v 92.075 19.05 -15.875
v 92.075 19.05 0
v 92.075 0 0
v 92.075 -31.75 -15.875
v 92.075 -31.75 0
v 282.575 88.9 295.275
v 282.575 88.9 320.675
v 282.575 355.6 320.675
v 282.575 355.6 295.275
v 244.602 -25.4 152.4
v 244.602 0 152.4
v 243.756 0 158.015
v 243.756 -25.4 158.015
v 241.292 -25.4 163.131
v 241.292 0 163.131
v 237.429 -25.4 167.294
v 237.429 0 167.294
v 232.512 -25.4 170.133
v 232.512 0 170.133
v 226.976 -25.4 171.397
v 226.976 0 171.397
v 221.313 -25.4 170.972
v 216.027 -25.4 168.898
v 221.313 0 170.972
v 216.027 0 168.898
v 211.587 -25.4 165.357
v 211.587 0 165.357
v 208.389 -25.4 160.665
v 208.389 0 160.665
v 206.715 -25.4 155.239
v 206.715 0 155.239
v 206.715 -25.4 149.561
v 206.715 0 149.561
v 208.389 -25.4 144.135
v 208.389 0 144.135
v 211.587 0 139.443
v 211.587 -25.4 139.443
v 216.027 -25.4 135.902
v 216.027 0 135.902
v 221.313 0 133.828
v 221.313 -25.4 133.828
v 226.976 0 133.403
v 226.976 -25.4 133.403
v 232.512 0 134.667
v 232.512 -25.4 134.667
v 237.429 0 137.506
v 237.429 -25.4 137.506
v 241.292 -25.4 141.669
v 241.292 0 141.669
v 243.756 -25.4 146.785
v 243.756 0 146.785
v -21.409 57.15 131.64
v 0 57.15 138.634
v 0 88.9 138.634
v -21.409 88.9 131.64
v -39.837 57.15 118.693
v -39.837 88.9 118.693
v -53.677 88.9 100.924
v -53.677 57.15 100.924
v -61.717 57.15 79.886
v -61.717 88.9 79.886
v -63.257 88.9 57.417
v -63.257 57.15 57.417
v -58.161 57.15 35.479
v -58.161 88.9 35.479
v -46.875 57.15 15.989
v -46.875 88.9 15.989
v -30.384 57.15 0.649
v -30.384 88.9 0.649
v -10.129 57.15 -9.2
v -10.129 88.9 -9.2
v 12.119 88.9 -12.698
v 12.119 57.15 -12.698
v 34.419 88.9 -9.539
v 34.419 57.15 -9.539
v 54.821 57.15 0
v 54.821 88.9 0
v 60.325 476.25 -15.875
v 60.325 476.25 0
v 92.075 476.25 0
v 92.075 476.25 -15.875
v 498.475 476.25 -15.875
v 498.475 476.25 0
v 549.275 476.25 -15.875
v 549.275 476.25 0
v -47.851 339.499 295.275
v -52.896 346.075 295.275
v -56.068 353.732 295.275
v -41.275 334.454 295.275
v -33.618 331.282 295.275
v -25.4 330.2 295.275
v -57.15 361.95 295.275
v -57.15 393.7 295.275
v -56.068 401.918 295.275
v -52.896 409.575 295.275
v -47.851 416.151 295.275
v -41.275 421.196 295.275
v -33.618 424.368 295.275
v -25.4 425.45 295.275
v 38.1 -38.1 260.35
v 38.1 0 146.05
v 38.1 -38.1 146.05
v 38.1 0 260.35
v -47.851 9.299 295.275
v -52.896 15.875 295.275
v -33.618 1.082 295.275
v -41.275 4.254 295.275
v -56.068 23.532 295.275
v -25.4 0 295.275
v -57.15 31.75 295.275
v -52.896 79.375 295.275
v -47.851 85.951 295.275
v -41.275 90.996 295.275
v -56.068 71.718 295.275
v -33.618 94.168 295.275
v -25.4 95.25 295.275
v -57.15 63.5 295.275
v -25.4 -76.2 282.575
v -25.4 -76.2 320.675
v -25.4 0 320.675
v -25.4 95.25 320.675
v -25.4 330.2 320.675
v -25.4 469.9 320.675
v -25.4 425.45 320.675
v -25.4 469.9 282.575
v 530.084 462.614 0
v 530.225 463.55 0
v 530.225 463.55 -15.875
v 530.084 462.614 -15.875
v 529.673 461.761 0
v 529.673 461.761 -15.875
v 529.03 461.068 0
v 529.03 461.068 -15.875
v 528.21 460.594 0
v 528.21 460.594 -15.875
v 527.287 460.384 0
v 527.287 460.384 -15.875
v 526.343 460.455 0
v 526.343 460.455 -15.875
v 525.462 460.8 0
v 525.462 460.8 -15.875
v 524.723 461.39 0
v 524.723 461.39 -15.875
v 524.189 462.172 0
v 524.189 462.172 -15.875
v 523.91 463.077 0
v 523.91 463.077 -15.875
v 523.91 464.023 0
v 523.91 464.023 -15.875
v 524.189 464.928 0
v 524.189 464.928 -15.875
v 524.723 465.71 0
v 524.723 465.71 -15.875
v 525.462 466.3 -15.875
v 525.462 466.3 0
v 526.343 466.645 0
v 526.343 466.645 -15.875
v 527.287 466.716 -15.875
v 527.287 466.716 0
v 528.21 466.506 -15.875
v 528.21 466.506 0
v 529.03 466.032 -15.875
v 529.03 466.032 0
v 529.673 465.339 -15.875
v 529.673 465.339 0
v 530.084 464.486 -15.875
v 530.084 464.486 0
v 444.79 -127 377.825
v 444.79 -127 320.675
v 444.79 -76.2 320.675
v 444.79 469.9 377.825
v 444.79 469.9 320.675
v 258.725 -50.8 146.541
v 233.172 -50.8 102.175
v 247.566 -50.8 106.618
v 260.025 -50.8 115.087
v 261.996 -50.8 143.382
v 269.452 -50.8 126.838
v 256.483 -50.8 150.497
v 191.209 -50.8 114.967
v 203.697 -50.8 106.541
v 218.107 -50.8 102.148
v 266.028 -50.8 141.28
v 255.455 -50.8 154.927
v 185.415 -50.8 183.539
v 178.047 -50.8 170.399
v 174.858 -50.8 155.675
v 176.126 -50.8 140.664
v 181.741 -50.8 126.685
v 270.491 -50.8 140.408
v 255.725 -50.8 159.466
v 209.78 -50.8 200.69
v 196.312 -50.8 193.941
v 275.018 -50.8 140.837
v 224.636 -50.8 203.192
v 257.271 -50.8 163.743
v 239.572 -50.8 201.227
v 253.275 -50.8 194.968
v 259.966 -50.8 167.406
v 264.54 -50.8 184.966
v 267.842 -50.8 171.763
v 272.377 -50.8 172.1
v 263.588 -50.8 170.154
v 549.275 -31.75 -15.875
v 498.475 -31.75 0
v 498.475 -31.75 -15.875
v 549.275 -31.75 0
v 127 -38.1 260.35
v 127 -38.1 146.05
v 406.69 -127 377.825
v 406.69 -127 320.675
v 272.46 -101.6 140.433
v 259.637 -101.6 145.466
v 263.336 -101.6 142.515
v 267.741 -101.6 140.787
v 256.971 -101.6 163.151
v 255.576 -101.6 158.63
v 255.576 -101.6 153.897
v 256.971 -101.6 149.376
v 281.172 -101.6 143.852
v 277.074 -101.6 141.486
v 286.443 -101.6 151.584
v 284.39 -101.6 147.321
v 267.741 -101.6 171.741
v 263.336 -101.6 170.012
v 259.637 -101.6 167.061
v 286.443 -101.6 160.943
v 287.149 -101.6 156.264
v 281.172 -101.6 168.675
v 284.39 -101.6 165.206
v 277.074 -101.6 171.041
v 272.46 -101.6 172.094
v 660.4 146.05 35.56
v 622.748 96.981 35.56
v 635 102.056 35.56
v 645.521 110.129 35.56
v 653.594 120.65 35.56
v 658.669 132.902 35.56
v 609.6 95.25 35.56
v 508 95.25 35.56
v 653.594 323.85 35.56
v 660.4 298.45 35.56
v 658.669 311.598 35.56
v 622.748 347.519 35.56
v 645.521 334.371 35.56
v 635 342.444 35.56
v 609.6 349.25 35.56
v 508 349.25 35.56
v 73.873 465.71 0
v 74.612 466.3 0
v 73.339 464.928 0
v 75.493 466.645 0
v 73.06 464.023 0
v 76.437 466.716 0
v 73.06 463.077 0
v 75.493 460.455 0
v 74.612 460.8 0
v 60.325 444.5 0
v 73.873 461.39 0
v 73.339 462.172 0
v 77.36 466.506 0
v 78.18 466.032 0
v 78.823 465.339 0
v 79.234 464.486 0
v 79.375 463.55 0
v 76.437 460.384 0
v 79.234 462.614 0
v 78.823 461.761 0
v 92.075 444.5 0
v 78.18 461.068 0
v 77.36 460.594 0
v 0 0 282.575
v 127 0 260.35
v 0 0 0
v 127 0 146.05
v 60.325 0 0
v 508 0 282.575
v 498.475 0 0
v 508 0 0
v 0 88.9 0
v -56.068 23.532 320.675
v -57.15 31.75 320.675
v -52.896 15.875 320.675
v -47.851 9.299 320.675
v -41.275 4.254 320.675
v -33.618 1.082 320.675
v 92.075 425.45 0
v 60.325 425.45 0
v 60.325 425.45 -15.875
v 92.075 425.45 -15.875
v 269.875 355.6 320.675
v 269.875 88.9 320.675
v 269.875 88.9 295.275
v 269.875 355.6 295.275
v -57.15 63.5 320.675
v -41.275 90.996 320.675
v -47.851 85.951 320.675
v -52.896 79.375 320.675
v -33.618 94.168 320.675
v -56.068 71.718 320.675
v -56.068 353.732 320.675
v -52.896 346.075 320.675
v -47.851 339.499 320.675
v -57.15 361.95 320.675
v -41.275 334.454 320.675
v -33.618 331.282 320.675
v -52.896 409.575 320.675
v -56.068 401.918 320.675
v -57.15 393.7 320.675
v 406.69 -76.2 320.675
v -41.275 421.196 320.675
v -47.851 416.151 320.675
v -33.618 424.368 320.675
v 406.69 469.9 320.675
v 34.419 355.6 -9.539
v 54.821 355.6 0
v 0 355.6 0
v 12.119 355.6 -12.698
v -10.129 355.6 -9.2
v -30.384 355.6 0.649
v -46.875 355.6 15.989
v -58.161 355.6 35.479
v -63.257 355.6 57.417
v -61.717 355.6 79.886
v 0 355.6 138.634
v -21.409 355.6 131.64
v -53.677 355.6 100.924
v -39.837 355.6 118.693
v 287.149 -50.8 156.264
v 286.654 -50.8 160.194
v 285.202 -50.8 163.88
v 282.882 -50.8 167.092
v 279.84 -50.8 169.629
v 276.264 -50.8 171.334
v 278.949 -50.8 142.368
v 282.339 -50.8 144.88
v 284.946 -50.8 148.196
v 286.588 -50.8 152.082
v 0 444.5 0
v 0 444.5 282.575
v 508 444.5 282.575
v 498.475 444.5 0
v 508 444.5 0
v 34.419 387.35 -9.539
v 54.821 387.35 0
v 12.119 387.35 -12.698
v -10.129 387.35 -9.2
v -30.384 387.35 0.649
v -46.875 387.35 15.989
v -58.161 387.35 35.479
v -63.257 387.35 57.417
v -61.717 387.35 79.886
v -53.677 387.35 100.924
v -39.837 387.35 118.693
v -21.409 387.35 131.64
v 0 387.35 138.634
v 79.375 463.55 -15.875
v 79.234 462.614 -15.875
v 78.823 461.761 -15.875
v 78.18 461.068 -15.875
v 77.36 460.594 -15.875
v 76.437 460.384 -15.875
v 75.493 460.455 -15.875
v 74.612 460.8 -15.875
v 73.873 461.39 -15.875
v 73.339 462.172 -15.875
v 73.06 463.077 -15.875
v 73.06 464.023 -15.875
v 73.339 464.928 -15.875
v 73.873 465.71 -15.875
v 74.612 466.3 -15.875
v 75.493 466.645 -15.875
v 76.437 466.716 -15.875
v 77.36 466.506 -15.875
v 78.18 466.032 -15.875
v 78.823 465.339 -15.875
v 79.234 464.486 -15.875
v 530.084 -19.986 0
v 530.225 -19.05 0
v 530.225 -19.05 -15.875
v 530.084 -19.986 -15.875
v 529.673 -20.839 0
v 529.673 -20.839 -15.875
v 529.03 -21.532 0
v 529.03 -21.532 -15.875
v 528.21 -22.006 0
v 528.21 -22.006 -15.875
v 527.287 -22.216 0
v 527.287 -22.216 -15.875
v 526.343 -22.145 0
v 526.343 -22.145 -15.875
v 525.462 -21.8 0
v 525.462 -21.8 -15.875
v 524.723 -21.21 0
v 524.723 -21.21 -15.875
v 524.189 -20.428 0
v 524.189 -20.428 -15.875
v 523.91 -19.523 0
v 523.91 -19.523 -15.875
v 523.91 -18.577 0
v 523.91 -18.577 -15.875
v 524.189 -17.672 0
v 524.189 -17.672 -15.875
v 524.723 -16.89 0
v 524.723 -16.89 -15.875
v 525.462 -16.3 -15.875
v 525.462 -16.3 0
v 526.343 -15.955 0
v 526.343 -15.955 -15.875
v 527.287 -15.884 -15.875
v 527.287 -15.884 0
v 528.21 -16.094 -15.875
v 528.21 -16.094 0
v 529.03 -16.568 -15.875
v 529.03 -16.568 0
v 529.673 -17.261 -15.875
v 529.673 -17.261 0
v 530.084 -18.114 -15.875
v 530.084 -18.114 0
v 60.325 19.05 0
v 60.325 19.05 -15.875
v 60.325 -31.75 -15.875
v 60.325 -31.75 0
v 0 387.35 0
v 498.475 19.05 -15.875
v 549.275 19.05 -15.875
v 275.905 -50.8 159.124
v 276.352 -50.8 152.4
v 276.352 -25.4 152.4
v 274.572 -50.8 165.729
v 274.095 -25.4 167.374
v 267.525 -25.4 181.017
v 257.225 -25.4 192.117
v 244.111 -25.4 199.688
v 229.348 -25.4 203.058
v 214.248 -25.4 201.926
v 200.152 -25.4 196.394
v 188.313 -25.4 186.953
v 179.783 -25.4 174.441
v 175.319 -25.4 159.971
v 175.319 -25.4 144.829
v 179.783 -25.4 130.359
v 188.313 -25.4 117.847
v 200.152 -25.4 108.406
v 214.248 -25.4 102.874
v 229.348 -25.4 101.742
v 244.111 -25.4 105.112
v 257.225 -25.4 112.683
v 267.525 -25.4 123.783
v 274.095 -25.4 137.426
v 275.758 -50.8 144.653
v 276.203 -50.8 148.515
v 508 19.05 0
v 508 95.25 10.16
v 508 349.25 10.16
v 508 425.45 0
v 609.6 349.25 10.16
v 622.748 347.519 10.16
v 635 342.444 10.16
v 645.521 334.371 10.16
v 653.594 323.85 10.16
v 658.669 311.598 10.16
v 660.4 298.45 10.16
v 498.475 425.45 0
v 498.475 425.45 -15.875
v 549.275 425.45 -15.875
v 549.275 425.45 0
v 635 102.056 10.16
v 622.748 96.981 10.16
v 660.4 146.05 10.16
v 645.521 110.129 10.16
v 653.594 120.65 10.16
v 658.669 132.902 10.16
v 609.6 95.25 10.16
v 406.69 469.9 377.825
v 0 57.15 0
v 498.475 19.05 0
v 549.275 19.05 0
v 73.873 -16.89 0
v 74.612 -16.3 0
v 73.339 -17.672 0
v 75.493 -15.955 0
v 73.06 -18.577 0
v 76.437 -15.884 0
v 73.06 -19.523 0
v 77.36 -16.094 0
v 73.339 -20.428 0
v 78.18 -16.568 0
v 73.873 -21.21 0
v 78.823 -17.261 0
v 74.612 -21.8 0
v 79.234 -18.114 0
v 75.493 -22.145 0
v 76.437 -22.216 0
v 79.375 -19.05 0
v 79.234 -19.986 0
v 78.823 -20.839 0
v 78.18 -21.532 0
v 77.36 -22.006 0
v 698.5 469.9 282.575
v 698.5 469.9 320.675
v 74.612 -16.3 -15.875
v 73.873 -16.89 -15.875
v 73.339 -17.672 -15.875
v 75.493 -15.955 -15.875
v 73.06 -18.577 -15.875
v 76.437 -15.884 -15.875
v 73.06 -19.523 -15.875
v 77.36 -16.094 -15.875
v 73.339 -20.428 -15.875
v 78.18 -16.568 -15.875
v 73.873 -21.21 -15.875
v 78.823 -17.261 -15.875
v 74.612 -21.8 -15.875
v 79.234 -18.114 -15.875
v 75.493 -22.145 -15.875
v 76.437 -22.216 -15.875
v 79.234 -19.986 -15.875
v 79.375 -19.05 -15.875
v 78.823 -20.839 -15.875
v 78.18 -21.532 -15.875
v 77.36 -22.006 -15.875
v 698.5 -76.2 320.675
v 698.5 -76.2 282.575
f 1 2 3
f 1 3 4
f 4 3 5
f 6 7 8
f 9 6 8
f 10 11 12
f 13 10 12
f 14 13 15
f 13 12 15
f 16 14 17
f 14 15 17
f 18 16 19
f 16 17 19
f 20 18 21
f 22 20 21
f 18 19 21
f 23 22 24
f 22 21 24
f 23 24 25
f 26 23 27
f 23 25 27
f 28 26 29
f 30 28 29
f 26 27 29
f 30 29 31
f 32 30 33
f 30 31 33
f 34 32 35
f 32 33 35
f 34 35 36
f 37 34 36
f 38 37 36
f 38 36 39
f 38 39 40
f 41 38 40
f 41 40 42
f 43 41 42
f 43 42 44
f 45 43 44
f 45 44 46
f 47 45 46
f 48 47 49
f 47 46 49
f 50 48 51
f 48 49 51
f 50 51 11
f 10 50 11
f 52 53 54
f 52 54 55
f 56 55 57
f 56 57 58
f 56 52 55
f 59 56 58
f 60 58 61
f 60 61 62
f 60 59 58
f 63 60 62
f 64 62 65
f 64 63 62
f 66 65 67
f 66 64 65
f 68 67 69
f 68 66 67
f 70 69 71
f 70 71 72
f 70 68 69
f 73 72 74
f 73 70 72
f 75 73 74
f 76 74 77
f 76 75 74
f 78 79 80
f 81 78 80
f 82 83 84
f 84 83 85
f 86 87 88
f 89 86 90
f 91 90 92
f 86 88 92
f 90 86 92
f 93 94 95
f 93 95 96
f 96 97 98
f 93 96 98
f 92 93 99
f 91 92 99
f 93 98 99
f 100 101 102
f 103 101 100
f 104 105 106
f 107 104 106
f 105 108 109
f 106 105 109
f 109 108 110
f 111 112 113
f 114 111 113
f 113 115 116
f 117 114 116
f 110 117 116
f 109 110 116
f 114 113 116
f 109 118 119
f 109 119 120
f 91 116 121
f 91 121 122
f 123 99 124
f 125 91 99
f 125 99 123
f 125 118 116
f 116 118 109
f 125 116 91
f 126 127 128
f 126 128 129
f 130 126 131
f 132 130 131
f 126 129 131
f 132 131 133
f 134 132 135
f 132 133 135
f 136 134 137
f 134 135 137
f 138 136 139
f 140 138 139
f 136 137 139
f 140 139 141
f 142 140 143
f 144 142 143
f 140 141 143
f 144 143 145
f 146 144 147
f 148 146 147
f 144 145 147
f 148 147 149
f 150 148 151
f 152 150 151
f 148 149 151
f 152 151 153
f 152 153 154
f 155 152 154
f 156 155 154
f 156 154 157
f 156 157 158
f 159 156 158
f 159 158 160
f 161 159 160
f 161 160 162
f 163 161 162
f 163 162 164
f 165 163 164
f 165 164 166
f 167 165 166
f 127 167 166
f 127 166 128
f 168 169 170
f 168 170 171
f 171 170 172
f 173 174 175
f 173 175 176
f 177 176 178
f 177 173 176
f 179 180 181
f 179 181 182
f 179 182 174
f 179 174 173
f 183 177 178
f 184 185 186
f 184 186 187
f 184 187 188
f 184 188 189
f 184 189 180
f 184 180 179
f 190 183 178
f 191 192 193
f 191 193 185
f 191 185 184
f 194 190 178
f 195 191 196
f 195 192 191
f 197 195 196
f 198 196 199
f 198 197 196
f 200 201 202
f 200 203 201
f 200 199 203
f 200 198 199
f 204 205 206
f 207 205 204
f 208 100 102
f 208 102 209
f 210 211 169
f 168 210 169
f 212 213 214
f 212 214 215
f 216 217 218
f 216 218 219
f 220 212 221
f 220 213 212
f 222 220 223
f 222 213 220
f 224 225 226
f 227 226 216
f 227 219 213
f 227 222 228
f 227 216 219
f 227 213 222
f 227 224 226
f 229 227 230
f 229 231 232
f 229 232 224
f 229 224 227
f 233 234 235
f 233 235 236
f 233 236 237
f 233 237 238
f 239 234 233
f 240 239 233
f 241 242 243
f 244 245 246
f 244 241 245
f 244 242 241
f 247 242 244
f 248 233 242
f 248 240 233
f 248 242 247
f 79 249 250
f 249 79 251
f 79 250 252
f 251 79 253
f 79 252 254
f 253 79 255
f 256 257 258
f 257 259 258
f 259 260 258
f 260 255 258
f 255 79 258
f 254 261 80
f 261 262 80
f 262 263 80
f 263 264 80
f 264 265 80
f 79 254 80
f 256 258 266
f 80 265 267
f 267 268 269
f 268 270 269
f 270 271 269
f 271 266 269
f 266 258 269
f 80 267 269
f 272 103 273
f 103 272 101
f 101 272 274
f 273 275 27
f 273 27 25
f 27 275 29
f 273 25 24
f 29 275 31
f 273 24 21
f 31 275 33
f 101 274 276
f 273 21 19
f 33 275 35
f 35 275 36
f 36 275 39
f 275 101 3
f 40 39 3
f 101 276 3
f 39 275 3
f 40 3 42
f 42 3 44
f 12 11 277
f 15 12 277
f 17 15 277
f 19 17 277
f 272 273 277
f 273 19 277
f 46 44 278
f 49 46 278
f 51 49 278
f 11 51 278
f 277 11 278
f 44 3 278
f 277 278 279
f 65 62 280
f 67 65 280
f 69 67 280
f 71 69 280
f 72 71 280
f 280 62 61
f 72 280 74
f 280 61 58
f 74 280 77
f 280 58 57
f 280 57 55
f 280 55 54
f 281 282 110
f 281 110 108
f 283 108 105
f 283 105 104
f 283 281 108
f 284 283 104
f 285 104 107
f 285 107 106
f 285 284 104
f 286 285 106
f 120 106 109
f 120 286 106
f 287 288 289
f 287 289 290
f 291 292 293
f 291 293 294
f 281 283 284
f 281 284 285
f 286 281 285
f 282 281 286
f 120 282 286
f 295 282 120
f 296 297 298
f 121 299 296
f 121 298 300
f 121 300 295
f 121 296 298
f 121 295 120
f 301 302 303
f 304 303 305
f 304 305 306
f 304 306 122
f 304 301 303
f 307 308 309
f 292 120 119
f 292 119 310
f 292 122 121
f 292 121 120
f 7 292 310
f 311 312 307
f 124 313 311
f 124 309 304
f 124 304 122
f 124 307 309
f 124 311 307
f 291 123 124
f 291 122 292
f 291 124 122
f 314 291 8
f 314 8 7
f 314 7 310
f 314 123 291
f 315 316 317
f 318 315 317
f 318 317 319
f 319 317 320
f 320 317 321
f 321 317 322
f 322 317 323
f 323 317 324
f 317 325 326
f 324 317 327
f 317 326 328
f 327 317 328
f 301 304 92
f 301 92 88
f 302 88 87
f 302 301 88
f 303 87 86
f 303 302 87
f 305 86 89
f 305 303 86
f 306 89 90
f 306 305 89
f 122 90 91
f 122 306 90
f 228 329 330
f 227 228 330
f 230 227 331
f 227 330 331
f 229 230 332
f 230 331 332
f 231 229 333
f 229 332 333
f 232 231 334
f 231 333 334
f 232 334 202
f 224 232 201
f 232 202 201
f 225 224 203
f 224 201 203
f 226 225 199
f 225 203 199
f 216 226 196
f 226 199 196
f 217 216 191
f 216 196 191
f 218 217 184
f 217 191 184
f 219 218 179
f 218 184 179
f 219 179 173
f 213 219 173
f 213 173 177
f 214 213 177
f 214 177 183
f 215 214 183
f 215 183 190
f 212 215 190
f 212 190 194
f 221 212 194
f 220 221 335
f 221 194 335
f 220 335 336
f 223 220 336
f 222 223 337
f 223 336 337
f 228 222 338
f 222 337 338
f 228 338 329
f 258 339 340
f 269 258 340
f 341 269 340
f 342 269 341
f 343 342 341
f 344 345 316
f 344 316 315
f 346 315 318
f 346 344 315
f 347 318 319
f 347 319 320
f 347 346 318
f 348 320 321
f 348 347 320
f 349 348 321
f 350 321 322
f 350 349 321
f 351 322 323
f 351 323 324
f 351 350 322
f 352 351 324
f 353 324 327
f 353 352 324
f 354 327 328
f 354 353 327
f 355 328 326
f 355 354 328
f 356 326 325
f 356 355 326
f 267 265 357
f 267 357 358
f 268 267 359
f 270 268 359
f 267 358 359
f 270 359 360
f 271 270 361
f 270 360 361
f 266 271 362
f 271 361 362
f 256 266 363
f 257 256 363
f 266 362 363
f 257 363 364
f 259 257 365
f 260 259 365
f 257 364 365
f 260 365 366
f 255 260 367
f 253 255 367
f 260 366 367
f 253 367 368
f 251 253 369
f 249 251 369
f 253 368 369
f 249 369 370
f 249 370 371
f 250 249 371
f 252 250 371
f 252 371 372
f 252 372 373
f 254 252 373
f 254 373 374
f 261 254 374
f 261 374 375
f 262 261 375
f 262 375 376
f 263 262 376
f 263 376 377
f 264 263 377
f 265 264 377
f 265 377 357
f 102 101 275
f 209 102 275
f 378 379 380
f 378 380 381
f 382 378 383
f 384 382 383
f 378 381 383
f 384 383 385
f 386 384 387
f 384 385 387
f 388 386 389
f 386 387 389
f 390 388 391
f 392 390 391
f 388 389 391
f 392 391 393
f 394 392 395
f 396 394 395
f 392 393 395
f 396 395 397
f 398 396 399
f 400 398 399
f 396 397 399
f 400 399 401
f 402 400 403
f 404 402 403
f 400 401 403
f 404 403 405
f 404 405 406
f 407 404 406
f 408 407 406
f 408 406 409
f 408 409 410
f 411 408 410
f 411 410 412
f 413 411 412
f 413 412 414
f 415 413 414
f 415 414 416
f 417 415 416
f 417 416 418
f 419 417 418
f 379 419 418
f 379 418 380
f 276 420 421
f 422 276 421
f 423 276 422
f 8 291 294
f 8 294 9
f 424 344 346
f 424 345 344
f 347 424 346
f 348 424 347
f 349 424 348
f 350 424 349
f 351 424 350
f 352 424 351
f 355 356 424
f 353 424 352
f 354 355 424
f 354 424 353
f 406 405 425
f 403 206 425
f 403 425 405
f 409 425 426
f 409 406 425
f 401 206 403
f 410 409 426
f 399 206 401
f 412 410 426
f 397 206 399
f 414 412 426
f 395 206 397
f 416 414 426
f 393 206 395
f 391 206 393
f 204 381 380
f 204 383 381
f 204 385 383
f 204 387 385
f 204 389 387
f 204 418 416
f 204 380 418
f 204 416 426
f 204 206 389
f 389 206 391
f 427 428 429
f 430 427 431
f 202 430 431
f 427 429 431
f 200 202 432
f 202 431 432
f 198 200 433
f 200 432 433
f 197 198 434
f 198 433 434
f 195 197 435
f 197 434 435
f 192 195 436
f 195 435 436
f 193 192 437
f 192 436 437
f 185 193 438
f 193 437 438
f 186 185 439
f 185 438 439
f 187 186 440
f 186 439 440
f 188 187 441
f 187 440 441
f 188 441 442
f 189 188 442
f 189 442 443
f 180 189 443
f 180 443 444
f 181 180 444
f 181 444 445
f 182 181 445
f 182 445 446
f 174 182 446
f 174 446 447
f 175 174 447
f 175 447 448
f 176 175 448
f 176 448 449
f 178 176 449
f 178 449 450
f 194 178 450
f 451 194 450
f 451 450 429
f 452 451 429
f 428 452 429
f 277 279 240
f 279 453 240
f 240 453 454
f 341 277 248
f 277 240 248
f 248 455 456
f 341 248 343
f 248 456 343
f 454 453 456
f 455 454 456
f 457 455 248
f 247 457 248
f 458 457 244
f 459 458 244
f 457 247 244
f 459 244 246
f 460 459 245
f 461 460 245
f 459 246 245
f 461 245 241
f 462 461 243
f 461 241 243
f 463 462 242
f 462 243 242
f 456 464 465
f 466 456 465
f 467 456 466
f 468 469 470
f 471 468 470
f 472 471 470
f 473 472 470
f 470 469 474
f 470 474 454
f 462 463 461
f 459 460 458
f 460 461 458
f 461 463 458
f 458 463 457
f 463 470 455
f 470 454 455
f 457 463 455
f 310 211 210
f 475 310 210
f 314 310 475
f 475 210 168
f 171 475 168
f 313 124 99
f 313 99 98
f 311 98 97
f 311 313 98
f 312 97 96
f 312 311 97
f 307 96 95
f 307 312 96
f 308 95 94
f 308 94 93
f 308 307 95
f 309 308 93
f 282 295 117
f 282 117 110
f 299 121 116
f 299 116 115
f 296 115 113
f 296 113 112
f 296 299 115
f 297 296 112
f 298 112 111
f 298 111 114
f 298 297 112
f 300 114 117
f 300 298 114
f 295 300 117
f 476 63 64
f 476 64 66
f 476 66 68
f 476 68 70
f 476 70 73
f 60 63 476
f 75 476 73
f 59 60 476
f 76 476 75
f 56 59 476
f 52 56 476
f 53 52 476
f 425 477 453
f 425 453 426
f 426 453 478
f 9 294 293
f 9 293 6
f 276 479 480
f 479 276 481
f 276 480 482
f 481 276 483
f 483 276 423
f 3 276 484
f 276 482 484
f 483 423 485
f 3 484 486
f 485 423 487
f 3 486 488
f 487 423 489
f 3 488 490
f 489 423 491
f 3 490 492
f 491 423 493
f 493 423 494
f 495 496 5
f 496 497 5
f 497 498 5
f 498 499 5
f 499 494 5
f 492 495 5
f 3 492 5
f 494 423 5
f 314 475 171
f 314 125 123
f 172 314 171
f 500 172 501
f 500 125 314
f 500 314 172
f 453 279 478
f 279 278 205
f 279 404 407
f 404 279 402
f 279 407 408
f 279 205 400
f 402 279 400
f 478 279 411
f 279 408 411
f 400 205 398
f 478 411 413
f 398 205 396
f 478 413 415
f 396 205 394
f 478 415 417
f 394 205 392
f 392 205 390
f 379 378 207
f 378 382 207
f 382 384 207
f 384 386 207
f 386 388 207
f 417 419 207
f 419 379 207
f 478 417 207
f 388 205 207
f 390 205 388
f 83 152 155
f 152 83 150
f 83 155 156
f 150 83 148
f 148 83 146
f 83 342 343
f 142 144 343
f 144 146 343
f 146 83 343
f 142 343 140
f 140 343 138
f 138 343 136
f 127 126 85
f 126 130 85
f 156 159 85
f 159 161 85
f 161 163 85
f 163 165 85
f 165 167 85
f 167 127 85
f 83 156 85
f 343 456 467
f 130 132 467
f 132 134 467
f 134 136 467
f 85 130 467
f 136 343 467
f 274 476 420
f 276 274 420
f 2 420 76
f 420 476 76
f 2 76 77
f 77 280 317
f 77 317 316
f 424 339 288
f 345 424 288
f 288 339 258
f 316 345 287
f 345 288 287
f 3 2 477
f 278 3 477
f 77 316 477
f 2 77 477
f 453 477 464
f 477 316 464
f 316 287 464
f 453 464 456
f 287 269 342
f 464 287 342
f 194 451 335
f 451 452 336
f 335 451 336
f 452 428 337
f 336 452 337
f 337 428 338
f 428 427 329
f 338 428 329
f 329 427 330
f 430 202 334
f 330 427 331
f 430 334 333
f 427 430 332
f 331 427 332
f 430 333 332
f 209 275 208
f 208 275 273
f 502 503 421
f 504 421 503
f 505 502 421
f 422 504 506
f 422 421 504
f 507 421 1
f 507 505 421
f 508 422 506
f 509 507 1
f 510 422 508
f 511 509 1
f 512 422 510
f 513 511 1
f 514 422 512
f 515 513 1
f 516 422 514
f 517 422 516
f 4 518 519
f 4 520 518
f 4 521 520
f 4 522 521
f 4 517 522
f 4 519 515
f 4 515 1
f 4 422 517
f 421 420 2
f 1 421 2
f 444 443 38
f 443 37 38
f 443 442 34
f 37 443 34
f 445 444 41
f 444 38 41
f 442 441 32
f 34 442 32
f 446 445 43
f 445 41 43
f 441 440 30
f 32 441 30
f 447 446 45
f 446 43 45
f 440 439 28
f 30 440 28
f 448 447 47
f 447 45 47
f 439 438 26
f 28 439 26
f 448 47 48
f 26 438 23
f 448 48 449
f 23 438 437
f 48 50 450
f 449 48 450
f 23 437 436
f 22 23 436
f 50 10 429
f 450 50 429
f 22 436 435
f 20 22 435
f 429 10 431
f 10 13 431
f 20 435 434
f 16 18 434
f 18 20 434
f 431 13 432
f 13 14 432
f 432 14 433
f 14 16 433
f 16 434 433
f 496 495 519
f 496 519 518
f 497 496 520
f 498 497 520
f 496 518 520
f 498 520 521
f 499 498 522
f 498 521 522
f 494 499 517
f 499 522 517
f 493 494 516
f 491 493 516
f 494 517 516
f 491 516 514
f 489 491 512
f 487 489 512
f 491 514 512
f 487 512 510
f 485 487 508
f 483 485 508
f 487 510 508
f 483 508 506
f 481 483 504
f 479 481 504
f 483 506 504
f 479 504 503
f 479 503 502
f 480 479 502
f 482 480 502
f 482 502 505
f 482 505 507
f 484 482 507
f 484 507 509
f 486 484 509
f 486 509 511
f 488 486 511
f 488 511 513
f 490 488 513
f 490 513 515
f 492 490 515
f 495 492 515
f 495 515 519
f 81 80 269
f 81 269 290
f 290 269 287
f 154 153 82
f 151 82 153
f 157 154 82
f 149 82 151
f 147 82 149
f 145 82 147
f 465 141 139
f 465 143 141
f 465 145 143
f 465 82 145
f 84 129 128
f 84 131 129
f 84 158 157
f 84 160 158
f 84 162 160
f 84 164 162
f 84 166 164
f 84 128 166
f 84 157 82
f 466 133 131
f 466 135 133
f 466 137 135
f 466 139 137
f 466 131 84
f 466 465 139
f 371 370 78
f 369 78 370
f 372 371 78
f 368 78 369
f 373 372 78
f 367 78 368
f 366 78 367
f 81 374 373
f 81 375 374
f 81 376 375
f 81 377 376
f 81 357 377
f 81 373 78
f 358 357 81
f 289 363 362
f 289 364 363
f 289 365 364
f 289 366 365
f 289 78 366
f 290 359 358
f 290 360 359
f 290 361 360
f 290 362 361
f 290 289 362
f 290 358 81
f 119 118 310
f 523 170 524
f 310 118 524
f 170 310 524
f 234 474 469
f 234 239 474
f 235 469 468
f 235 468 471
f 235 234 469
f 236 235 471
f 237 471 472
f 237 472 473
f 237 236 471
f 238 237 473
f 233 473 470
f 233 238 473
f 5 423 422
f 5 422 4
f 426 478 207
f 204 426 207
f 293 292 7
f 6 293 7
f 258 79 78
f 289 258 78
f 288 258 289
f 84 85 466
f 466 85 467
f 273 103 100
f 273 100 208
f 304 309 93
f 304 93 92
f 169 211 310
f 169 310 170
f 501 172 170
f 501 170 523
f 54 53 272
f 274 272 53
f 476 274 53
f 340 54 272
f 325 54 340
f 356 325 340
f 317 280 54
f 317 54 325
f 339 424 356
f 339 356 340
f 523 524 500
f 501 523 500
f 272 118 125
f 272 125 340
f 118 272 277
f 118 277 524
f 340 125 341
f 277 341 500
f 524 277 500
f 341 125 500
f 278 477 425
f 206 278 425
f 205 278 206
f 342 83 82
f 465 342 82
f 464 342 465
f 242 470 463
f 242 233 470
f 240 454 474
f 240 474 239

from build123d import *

# Parameters (mm, degrees)
F0_W      = 508
F0_H      = 444.5
F1_DEPTH  = 282.575
F2_W      = 31.75
F2_H      = 50.8
F2_W_2    = 50.8
F3_DEPTH  = 15.875
F4_W      = 723.9
F4_H      = 546.1
F5_DEPTH  = 38.1
F7_W      = 12.7
F7_H      = 266.7
F8_DEPTH  = 25.4
F9_W      = 38.1
F9_H      = 596.9
F10_DEPTH = 57.15
F11_W     = 254
F11_H     = 25.4
F12_DEPTH = 152.4
F13_R     = 50.8
F15_DEPTH = 25.4
F17_R     = 76.2
F18_DEPTH = 31.75
F20_R     = 76.2
F21_DEPTH = 31.75
F22_R     = 3.175
F23_DEPTH = 25.4
F24_R     = 19.05
F25_DEPTH = 25.4
F26_R     = 50.8
F27_DEPTH = 25.4
F28_R     = 15.875
F29_DEPTH = 50.8
F30_W     = 88.9
F30_H     = 114.3
F31_DEPTH = 38.1


with BuildPart() as f1:
    # F0 (on Top) → F1 (new body)
    with BuildSketch(Plane.XY):
        with Locations((254, 222.25)):
            Rectangle(F0_W, F0_H)
    extrude(amount=F1_DEPTH)

    # F2 (on face) → F3 (join)
    with BuildSketch(Plane(origin=(0, 0, 0), x_dir=(1, 0, 0), z_dir=(0, 0, -1))):
        with Locations((76.2, 6.35)):
            Rectangle(F2_W, F2_H)
        with Locations((523.875, 6.35)):
            Rectangle(F2_W_2, F2_H)
        with Locations((76.2, -450.85)):
            Rectangle(F2_W, F2_H)
        with Locations((523.875, -450.85)):
            Rectangle(F2_W_2, F2_H)
    extrude(amount=F3_DEPTH)

    # F4 (on face) → F5 (join)
    with BuildSketch(Plane.XY.offset(282.575)):
        with Locations((336.55, 196.85)):
            Rectangle(F4_W, F4_H)
    extrude(amount=F5_DEPTH)

    # F7 (on face) → F8 (cut)
    with BuildSketch(Plane.XY.offset(320.675)):
        with Locations((276.225, 222.25)):
            Rectangle(F7_W, F7_H)
    extrude(amount=-F8_DEPTH, mode=Mode.SUBTRACT)

    # F9 (on face) → F10 (join)
    with BuildSketch(Plane.XY.offset(320.675)):
        with Locations((425.7404655218, 171.45)):
            Rectangle(F9_W, F9_H)
    extrude(amount=F10_DEPTH)

    # F11 (on face) → F12 (join)
    with BuildSketch(Plane.YZ.offset(508)):
        with Locations((222.25, 22.86)):
            Rectangle(F11_W, F11_H)
    extrude(amount=F12_DEPTH)

    # F13
    f13_edges = [f1.edges().sort_by_distance(p)[0] for p in [
        (660.4, 95.25, 22.86),
        (660.4, 349.25, 22.86),
    ]]
    fillet(f13_edges, radius=F13_R)

    # F14 (on face) → F15 (join)
    with BuildSketch(Plane.XY.offset(320.675)):
        with BuildLine():
            ThreePointArc((-57.15, 31.75), (-47.8506403027, 9.2993596973), (-25.4, 0))
            Line((-25.4, 0), (-25.4, 95.25))
            ThreePointArc((-25.4, 95.25), (-47.8506403027, 85.9506403027), (-57.15, 63.5))
            Line((-57.15, 63.5), (-57.15, 31.75))
        make_face()
        with BuildLine():
            Line((-25.4, 330.2), (-25.4, 425.45))
            ThreePointArc((-25.4, 425.45), (-47.8506403027, 416.1506403027), (-57.15, 393.7))
            Line((-57.15, 393.7), (-57.15, 361.95))
            ThreePointArc((-57.15, 361.95), (-47.8506403027, 339.4993596973), (-25.4, 330.2))
        make_face()
    extrude(amount=-F15_DEPTH)

    # F17 (on offset) → F18 (join)
    with BuildSketch(Plane.XZ.offset(-57.15)):
        with Locations((12.7, 63.5)):
            Circle(F17_R)
    extrude(amount=-F18_DEPTH)

    # F20 (on offset) → F21 (join)
    with BuildSketch(Plane(origin=(0, 387.35, 0), x_dir=(-1, 0, 0), z_dir=(0, 1, 0))):
        with Locations((-12.7, 63.5)):
            Circle(F20_R)
    extrude(amount=-F21_DEPTH)

    # F22 (on face) → F23 (cut)
    with BuildSketch(Plane(origin=(0, 0, -15.875), x_dir=(1, 0, 0), z_dir=(0, 0, -1))):
        with Locations((76.2, 19.05)):
            Circle(F22_R)
        with Locations((76.2, -463.55)):
            Circle(F22_R)
        with Locations((527.05, -463.55)):
            Circle(F22_R)
        with Locations((527.05, 19.05)):
            Circle(F22_R)
    extrude(amount=-F23_DEPTH, mode=Mode.SUBTRACT)

    # F24 (on face) → F25 (join)
    with BuildSketch(Plane.XZ):
        with Locations((225.552, 152.4)):
            Circle(F24_R)
    extrude(amount=F25_DEPTH)

    # F26 (on face) → F27 (join)
    with BuildSketch(Plane.XZ.offset(25.4)):
        with Locations((225.552, 152.4)):
            Circle(F26_R)
    extrude(amount=F27_DEPTH)

    # F28 (on face) → F29 (join)
    with BuildSketch(Plane.XZ.offset(50.8)):
        with Locations((271.2737321854, 156.2635451555)):
            Circle(F28_R)
    extrude(amount=F29_DEPTH)

    # F30 (on face) → F31 (join)
    with BuildSketch(Plane.XZ):
        with Locations((82.55, 203.2)):
            Rectangle(F30_W, F30_H)
    extrude(amount=F31_DEPTH)


solid = f1.part
